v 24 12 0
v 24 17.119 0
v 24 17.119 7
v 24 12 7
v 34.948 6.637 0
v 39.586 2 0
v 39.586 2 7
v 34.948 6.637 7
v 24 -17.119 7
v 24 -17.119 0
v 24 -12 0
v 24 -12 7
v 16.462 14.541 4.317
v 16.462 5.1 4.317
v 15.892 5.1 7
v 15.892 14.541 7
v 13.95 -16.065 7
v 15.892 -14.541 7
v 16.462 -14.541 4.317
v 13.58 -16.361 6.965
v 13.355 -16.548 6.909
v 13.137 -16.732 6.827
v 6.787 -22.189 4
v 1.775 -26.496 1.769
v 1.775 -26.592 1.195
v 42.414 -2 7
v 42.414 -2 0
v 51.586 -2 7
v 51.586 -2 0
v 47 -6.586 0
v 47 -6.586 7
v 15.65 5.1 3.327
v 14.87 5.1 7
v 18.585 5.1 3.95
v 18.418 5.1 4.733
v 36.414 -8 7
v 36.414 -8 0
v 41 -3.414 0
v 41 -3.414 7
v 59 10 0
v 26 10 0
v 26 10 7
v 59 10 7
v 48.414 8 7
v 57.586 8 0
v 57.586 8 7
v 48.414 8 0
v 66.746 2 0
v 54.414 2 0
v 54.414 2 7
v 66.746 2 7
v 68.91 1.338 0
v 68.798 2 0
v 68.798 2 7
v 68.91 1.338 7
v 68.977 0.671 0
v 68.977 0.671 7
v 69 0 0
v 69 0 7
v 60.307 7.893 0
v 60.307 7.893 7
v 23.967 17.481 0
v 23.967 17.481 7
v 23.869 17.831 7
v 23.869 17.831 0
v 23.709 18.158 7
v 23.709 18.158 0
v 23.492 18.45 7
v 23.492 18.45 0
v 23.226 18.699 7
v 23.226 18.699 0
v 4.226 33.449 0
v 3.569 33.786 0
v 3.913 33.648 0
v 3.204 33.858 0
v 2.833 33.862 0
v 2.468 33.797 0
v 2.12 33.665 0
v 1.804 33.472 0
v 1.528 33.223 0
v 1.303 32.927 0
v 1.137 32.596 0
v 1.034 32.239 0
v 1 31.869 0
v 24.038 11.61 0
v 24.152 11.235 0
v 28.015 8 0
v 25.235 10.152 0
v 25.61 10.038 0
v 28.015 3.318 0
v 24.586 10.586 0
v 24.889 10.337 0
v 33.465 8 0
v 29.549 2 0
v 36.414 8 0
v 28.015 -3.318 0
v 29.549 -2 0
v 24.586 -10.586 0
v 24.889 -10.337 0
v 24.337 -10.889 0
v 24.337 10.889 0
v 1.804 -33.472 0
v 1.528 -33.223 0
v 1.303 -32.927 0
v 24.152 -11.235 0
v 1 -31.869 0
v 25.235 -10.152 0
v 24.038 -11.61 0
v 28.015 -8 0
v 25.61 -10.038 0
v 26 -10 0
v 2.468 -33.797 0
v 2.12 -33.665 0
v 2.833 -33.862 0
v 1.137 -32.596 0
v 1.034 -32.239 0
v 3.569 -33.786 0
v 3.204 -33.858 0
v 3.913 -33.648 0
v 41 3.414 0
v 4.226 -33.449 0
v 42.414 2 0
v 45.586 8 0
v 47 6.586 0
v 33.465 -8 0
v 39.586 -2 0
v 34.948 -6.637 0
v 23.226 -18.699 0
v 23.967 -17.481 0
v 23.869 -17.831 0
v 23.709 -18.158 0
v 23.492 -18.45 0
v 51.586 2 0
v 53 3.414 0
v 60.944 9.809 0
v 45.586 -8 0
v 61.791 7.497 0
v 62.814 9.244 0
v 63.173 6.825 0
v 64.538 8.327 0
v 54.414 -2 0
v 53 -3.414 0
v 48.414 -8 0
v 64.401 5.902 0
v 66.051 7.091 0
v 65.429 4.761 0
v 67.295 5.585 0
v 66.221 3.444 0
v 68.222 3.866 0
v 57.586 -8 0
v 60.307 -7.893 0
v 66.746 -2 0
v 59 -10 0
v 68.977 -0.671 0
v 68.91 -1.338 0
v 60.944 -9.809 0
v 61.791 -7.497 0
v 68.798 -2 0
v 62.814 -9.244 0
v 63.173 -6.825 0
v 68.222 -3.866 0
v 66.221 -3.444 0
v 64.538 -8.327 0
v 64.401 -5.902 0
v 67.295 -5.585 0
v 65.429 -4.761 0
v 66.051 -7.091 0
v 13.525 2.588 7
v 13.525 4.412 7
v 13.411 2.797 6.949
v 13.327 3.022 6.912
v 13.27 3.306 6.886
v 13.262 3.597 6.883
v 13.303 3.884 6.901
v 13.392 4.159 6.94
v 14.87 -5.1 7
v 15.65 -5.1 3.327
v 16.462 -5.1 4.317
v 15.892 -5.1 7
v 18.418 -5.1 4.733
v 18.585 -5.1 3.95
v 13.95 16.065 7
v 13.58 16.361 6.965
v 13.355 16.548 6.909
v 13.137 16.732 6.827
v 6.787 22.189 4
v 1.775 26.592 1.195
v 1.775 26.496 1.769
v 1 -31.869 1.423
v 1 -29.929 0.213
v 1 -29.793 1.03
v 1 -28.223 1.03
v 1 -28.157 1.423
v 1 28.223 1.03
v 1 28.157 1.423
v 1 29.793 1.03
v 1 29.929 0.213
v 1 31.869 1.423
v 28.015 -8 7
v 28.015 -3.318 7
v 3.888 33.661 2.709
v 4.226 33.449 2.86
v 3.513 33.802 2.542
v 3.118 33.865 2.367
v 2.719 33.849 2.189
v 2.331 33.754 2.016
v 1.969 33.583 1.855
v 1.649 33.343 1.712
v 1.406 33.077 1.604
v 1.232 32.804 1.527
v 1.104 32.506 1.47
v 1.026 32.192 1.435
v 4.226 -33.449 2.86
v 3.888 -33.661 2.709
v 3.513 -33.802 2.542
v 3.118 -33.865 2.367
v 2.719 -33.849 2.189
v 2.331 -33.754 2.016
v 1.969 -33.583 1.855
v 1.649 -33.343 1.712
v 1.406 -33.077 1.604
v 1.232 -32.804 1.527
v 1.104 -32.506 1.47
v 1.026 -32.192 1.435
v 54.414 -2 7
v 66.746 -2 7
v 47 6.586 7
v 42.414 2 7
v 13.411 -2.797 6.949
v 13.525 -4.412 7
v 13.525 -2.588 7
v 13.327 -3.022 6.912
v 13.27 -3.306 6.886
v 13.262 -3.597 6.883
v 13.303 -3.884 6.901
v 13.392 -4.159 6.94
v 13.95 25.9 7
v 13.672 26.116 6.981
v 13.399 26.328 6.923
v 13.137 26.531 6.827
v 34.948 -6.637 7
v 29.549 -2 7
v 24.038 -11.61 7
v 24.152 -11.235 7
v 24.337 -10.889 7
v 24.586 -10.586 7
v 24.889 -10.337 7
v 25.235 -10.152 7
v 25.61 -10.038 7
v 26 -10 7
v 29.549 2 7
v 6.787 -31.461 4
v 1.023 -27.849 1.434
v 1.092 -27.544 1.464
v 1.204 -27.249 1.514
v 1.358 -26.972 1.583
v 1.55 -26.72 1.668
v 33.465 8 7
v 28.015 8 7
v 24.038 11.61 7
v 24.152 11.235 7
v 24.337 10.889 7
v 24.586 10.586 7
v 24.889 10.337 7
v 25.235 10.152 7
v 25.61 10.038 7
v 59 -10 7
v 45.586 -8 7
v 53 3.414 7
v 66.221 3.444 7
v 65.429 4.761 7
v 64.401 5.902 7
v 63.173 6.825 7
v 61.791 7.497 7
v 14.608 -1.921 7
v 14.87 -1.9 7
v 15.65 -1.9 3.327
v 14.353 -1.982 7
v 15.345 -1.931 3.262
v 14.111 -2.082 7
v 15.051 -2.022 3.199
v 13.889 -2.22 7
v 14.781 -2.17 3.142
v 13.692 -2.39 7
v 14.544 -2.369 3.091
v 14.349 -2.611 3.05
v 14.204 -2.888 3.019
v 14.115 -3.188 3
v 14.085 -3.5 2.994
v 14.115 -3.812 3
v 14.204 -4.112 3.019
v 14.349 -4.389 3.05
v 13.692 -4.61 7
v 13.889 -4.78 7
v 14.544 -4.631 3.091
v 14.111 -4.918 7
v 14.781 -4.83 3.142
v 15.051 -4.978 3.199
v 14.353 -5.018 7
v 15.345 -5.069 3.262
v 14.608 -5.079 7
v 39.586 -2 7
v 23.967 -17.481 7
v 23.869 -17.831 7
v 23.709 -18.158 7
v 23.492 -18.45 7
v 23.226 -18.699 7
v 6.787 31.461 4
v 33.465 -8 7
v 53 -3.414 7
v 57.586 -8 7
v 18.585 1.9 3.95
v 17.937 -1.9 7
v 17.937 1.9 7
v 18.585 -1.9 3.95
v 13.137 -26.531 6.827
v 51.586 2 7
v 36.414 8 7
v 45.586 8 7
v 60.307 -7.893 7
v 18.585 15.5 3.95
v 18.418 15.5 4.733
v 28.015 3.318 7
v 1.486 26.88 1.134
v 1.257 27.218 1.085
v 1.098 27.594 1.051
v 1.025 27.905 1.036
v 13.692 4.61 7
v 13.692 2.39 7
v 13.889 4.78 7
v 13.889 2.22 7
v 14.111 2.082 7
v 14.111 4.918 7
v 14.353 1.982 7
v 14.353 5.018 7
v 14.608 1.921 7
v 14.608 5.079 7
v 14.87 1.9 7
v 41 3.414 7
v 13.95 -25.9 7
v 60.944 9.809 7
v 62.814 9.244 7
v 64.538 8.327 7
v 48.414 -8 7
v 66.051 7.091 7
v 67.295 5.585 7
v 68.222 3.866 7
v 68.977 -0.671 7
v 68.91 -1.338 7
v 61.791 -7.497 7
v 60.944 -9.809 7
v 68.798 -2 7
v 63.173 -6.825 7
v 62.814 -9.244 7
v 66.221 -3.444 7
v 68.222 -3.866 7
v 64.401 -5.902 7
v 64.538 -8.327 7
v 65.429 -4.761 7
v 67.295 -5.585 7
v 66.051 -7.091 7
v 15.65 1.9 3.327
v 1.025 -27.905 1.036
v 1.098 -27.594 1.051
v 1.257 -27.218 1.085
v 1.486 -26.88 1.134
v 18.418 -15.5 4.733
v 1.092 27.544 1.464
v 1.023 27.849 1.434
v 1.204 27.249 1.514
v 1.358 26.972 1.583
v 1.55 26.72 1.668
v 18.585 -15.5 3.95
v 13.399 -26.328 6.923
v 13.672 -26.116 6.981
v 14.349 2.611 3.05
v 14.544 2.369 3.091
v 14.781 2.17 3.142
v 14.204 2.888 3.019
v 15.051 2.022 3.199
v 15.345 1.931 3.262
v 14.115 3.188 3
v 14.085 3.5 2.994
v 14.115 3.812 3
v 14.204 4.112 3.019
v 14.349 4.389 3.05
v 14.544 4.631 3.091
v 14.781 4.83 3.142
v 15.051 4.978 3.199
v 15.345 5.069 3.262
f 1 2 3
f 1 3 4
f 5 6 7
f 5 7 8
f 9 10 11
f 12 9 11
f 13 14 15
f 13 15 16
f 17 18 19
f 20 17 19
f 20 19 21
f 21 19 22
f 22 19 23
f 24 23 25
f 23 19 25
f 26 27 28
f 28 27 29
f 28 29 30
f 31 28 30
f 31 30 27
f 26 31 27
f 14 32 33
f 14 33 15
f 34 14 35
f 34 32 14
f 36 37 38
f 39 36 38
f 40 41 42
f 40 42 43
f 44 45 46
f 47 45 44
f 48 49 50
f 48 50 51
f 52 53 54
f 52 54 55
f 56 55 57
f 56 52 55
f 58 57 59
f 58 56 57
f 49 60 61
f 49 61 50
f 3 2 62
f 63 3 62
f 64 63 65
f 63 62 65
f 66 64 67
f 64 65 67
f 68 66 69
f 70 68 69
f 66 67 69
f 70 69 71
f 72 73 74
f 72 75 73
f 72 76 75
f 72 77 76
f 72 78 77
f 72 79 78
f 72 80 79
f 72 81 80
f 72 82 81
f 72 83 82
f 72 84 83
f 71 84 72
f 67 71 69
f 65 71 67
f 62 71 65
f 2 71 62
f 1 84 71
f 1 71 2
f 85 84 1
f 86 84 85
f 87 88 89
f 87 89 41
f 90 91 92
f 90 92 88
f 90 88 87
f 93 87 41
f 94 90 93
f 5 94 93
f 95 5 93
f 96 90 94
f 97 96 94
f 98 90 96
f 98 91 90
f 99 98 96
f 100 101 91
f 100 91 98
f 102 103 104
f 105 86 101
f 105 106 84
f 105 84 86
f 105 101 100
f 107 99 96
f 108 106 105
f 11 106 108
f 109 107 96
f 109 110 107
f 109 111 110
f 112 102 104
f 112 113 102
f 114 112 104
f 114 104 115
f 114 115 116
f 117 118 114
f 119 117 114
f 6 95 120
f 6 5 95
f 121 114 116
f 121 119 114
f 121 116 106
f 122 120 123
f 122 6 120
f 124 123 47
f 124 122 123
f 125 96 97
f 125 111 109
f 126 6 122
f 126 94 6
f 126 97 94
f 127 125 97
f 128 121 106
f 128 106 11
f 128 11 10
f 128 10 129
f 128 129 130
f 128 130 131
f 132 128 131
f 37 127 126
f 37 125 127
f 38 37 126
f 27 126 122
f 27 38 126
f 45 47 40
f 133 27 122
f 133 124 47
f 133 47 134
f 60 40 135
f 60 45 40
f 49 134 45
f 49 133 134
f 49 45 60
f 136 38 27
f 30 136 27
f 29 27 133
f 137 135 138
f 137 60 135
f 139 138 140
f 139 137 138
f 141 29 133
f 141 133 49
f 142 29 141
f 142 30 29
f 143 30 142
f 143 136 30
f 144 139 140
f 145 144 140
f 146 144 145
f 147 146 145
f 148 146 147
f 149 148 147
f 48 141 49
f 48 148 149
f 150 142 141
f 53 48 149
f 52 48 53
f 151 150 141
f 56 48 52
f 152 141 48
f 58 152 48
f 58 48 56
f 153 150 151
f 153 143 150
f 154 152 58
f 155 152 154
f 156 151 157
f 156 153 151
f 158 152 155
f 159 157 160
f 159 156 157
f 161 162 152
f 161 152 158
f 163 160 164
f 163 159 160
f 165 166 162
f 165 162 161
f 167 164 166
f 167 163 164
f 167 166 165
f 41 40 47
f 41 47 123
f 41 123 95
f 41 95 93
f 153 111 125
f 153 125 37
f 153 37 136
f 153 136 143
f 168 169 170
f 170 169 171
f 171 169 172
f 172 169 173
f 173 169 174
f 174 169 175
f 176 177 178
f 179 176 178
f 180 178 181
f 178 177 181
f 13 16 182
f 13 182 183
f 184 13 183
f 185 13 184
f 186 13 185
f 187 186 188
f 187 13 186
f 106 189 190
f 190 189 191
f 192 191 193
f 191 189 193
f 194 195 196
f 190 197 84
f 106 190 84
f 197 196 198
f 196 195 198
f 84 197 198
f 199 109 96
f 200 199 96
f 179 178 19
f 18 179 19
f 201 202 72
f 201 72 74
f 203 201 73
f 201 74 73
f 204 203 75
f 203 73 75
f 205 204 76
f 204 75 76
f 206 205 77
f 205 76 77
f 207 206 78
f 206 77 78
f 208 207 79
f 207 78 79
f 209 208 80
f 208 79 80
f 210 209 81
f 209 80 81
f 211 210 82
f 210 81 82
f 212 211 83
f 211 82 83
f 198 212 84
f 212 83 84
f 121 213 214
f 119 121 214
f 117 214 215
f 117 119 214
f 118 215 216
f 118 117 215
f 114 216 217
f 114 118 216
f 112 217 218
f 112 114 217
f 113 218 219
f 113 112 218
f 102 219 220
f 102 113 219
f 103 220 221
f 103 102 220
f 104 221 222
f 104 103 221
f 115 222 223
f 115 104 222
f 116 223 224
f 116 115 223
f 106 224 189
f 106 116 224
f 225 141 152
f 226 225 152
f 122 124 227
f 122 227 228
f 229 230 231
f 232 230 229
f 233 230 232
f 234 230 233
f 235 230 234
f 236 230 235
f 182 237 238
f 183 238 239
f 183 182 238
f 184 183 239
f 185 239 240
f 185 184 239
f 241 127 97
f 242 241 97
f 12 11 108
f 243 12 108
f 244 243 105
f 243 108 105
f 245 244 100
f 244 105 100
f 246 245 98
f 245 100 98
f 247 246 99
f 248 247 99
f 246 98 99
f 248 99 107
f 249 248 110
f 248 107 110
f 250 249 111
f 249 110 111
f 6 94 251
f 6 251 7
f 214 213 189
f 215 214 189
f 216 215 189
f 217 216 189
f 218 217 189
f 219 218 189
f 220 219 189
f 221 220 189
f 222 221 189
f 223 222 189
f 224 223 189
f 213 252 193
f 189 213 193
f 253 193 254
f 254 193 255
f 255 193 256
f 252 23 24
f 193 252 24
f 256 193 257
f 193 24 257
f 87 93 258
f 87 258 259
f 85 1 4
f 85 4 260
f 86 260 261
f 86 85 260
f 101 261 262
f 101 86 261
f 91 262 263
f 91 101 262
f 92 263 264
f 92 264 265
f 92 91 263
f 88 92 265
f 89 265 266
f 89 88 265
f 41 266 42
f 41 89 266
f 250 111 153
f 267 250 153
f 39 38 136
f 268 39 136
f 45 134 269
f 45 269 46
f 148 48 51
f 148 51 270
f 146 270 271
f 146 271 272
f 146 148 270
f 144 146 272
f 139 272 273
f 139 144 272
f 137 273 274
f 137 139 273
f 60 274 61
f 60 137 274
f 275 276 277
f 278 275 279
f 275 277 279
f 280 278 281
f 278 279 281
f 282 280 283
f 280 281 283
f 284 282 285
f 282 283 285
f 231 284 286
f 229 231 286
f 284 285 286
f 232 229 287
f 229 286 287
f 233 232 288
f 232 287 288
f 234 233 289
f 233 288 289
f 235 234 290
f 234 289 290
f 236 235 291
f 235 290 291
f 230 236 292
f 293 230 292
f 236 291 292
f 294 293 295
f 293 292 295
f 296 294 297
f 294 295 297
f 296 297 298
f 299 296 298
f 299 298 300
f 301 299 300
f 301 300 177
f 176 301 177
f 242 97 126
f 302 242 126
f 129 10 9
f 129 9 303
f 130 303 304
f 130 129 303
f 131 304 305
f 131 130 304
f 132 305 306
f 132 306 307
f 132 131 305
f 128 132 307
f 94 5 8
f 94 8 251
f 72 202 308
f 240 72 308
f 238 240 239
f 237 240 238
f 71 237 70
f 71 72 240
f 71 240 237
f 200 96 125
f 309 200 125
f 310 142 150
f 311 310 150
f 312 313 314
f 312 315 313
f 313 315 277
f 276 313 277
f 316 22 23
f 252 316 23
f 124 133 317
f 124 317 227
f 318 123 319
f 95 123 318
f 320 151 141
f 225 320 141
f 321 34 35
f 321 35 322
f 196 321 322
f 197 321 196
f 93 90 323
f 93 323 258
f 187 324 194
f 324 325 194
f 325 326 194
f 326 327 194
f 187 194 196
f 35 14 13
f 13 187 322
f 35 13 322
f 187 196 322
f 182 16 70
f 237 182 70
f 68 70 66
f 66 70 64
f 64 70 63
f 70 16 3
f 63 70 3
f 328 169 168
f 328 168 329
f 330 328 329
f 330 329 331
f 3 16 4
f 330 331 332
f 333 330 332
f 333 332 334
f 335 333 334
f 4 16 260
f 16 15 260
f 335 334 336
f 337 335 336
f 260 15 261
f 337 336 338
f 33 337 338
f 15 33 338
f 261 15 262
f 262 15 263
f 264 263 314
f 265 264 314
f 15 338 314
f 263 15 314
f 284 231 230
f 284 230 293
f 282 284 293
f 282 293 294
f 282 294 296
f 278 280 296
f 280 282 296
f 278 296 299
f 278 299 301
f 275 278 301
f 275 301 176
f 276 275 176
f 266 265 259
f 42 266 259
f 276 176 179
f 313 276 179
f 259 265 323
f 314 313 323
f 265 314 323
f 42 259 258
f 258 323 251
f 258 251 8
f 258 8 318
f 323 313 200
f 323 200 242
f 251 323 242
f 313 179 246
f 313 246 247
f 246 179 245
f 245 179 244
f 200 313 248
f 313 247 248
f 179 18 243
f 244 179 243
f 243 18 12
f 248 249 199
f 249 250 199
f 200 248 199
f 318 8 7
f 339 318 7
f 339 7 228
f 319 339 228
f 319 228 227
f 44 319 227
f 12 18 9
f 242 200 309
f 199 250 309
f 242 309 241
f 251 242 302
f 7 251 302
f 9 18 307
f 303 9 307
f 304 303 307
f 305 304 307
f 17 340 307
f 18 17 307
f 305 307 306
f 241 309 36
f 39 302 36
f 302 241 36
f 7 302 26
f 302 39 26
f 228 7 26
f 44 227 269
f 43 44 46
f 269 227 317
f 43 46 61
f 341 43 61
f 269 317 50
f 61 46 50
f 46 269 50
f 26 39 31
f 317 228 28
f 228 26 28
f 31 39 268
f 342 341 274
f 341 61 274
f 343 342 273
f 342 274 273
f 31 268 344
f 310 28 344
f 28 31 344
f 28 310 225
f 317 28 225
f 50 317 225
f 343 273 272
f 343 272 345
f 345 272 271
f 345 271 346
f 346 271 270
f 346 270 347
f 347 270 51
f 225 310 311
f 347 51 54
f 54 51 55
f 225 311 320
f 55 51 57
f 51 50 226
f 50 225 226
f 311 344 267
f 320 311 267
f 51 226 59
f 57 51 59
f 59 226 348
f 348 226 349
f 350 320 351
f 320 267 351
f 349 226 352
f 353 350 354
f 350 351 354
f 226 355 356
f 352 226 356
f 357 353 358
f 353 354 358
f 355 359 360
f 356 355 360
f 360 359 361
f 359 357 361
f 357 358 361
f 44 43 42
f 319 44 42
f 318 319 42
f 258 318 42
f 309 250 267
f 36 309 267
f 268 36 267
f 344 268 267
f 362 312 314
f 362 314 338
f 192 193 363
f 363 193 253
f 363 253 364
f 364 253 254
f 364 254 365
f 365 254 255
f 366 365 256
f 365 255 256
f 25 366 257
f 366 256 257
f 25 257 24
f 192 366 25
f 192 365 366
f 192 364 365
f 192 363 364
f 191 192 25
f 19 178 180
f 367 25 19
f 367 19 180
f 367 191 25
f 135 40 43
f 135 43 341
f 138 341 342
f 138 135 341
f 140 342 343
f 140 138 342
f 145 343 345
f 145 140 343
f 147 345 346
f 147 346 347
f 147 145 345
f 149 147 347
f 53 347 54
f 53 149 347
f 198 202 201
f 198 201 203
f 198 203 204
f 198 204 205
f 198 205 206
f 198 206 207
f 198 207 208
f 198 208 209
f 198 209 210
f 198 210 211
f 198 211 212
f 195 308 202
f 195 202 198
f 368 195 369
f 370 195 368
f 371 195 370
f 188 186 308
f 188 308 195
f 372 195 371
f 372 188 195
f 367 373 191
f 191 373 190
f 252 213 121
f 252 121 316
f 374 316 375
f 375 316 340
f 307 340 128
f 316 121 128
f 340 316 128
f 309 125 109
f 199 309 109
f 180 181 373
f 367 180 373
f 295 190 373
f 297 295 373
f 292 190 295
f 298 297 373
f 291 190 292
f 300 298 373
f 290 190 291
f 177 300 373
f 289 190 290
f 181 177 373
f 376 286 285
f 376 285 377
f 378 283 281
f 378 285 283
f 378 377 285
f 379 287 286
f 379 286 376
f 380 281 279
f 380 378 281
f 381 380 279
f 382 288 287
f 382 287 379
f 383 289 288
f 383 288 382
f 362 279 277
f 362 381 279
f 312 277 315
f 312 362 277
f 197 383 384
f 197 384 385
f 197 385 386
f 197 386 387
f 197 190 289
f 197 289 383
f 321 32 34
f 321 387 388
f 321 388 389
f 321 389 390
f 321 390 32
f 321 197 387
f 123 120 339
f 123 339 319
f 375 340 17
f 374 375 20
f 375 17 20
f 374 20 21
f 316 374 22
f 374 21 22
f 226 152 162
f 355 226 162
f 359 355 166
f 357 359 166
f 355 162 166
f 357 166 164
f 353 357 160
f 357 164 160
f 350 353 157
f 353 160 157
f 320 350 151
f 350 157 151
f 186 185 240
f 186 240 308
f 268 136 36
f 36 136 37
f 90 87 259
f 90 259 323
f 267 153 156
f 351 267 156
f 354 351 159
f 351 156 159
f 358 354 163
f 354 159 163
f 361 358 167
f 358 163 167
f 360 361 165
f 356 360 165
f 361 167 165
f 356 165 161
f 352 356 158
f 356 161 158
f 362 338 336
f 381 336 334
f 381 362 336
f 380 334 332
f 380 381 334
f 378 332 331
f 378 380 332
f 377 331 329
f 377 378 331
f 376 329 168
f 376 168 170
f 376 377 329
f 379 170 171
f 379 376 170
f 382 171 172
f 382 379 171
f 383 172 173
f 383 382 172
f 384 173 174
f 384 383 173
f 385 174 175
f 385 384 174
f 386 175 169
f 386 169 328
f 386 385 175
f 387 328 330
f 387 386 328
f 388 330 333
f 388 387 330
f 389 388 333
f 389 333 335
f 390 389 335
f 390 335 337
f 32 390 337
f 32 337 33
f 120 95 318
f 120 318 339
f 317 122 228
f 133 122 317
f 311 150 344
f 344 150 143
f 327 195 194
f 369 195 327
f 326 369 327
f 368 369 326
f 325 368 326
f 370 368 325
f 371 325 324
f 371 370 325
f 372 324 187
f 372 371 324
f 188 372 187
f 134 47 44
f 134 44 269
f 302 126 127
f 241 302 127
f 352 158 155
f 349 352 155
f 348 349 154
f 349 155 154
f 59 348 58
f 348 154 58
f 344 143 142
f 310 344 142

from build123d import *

# Parameters (mm, degrees)
F1_DEPTH      = 7
F5_DEPTH      = 0.8
F6_REACH      = 40.8395042988
F7_W          = 36.7298226772
F7_H          = 7
F8_DEPTH      = 1
F9_DEPTH      = 45
F10_T1_DEPTH  = 7
F10_T3_DEPTH  = 21.8461795352
F10_T5_DEPTH  = 11.8964874596
F10_T7_DEPTH  = 11.956767541
F10_T12_DEPTH = 5.3023503656


# Not quite as in the source:
# - a fillet or chamfer that OpenCascade refuses, or shapes differently, is made with other operations: its cross-section is extruded or revolved along the edge and cut away or added


with BuildPart() as f1:
    # F0 (on Top) → F1 (new body)
    with BuildSketch(Plane.XY):
        with BuildLine():
            Line((0, 0), (0, -36.7298226772))
            Line((0, -36.7298226772), (24, -18.0982437298))
            Line((24, -18.0982437298), (24, -10))
            Line((24, -10), (59, -10))
            ThreePointArc((59, -10), (65.3245553203, -7.7459666924), (68.7979589711, -2))
            ThreePointArc((68.7979589711, -2), (68.9493615301, -1.0050896201), (69, 0))
            Line((69, 0), (0, 0))
        make_face()
        Polygon((33.4652661258, -8), (28.0146803707, -8), (28.0146803707, -3.3182508079), align=None, mode=Mode.SUBTRACT)
        Polygon((41, -3.4142135624), (45.5857864376, -8), (36.4142135624, -8), align=None, mode=Mode.SUBTRACT)
        Polygon((29.5494142449, -2), (39.5857864376, -2), (34.9483778196, -6.637408618), align=None, mode=Mode.SUBTRACT)
        Polygon((42.4142135624, -2), (51.5857864376, -2), (47, -6.5857864376), align=None, mode=Mode.SUBTRACT)
        Polygon((53, -3.4142135624), (57.5857864376, -8), (48.4142135624, -8), align=None, mode=Mode.SUBTRACT)
        with BuildLine():
            ThreePointArc((66.7459666924, -2), (64.4007894962, -5.9018194498), (60.3067648391, -7.8925512767))
            Line((60.3067648391, -7.8925512767), (54.4142135624, -2))
            Line((54.4142135624, -2), (66.7459666924, -2))
        make_face(mode=Mode.SUBTRACT)
    extrude(amount=F1_DEPTH)

    # F4 (on face) → F5 (cut)
    with BuildSketch(Plane(origin=(0, 0, 0), x_dir=(0.9781476007, 0, 0.2079116908), z_dir=(0.2079116908, 0, -0.9781476007))):
        Polygon((19, 15.5), (0, 30.75), (0, 28.1854591432), (17, 14.5407223011), (17, 5.1), (19, 5.1), align=None)
        with BuildLine():
            Line((17, 14.5407223011), (0, 28.1854591432))
            Line((0, 28.1854591432), (0, 0))
            Line((0, 0), (19, 0))
            Line((19, 0), (19, 1.9))
            Line((19, 1.9), (16, 1.9))
            ThreePointArc((16, 1.9), (14.4, 3.5), (16, 5.1))
            Line((16, 5.1), (17, 5.1))
            Line((17, 5.1), (17, 14.5407223011))
        make_face()
    extrude(amount=-F5_DEPTH, mode=Mode.SUBTRACT)

    f6_end = Plane(origin=(20.8323918984, -11.3984937311, 7), x_dir=(1, 0, 0), z_dir=(0, 0, 1))
    # F4 (on face) → F6 (cut, up to a plane its end follows)
    with BuildSketch(Plane(origin=(0, 0, 0), x_dir=(0.9781476007, 0, 0.2079116908), z_dir=(0.2079116908, 0, -0.9781476007))):
        with BuildLine():
            Line((17, 14.5407223011), (0, 28.1854591432))
            Line((0, 28.1854591432), (0, 0))
            Line((0, 0), (19, 0))
            Line((19, 0), (19, 1.9))
            Line((19, 1.9), (16, 1.9))
            ThreePointArc((16, 1.9), (14.4, 3.5), (16, 5.1))
            Line((16, 5.1), (17, 5.1))
            Line((17, 5.1), (17, 14.5407223011))
        make_face()
    f6_long = extrude(amount=-F6_REACH, mode=Mode.PRIVATE)
    add(split(f6_long, bisect_by=f6_end, keep=Keep.BOTTOM, mode=Mode.PRIVATE), mode=Mode.SUBTRACT)

    # F7 (on face) → F8 (cut)
    with BuildSketch(Plane(origin=(0, 0, 0), x_dir=(0, -1, 0), z_dir=(-1, 0, 0))):
        with Locations((18.3649113386, 3.5)):
            Rectangle(F7_W, F7_H)
    extrude(amount=-F8_DEPTH, mode=Mode.SUBTRACT)

    # F2 (on face) → F9 (cut)
    with BuildSketch(Plane(origin=(0, 0, 0), x_dir=(-1, 0, 0), z_dir=(0, 1, 0))):
        Polygon((0, 4), (-6.7871916141, 4), (0, 0.9781476007), align=None)
        Polygon((-13.5253019358, 7), (-6.7871916141, 4), (0, 4), (0, 7), align=None)
    extrude(amount=-F9_DEPTH, mode=Mode.SUBTRACT)

    # F10: fillet of radius 2 on 5 edges, made by hand

    # F10_s2 → F10_t1 (join)
    with BuildSketch(Plane.XY):
        with BuildLine():
            ThreePointArc((24, -12), (24.5857864376, -10.5857864376), (26, -10))
            Line((26, -10), (24, -10))
            Line((24, -10), (24, -12))
        make_face()
    extrude(amount=F10_T1_DEPTH)

    # F10_s4 → F10_t3 (cut)
    with BuildSketch(Plane.XY.offset(-10.2114016246)):
        with BuildLine():
            ThreePointArc((4.2264416068, -33.4487693246), (2.1204783157, -33.6651760692), (1, -31.8689462379))
            Line((1, -31.8689462379), (1, -35.9535068877))
            Line((1, -35.9535068877), (4.2264416068, -33.4487693246))
        make_face()
    extrude(amount=F10_T3_DEPTH, mode=Mode.SUBTRACT)

    # F10_s6 → F10_t5 (cut)
    with BuildSketch(Plane.XY.offset(-2.4482437298)):
        with BuildLine():
            ThreePointArc((24, -17.1189462379), (23.7962298313, -17.9984679222), (23.2264416068, -18.6987693246))
            Line((23.2264416068, -18.6987693246), (24, -18.0982437298))
            Line((24, -18.0982437298), (24, -17.1189462379))
        make_face()
    extrude(amount=F10_T5_DEPTH, mode=Mode.SUBTRACT)

    # F10_s8 → F10_t7 (cut)
    with BuildSketch(Plane.XZ.offset(15.3359324944)):
        with BuildLine():
            ThreePointArc((13.9504150591, 7), (13.5345916775, 6.9562952015), (13.136941773, 6.8270909153))
            Line((13.136941773, 6.8270909153), (13.5253019358, 7))
            Line((13.5253019358, 7), (13.9504150591, 7))
        make_face()
    extrude(amount=F10_T7_DEPTH, mode=Mode.SUBTRACT)


with BuildPart() as f10_tool10:
    # F10_s11 → F10_t12 (new body)
    with BuildSketch(Plane(origin=(0, -0.1012401159, -0.6066769302), x_dir=(1, 0, 0), z_dir=(0, -0.1646003505, -0.9863603422))):
        with BuildLine():
            ThreePointArc((1, 28.0074292273), (1.2043011265, 27.126824006), (1.7754655557, 26.4261274235))
            Line((1.7754655557, 26.4261274235), (1, 27.0266353601))
            Line((1, 27.0266353601), (1, 28.0074292273))
        make_face()
    extrude(amount=F10_T12_DEPTH)

    split(bisect_by=Plane(origin=(-0.1663293527, 0, 0.7825180806), x_dir=(0, 1, 0), z_dir=(-0.2079116908, 0, 0.9781476007)), keep=Keep.TOP)


with BuildPart() as f1_1:
    add(f1.part)

    # F10_t9: cut F10_tool10
    add(f10_tool10.part, mode=Mode.SUBTRACT)

    # F11: F1 across plane


with BuildPart() as f1_2:
    add(f1_1.part)
    add(f1_1.part.mirror(Plane.XZ))


solid = f1_2.part
